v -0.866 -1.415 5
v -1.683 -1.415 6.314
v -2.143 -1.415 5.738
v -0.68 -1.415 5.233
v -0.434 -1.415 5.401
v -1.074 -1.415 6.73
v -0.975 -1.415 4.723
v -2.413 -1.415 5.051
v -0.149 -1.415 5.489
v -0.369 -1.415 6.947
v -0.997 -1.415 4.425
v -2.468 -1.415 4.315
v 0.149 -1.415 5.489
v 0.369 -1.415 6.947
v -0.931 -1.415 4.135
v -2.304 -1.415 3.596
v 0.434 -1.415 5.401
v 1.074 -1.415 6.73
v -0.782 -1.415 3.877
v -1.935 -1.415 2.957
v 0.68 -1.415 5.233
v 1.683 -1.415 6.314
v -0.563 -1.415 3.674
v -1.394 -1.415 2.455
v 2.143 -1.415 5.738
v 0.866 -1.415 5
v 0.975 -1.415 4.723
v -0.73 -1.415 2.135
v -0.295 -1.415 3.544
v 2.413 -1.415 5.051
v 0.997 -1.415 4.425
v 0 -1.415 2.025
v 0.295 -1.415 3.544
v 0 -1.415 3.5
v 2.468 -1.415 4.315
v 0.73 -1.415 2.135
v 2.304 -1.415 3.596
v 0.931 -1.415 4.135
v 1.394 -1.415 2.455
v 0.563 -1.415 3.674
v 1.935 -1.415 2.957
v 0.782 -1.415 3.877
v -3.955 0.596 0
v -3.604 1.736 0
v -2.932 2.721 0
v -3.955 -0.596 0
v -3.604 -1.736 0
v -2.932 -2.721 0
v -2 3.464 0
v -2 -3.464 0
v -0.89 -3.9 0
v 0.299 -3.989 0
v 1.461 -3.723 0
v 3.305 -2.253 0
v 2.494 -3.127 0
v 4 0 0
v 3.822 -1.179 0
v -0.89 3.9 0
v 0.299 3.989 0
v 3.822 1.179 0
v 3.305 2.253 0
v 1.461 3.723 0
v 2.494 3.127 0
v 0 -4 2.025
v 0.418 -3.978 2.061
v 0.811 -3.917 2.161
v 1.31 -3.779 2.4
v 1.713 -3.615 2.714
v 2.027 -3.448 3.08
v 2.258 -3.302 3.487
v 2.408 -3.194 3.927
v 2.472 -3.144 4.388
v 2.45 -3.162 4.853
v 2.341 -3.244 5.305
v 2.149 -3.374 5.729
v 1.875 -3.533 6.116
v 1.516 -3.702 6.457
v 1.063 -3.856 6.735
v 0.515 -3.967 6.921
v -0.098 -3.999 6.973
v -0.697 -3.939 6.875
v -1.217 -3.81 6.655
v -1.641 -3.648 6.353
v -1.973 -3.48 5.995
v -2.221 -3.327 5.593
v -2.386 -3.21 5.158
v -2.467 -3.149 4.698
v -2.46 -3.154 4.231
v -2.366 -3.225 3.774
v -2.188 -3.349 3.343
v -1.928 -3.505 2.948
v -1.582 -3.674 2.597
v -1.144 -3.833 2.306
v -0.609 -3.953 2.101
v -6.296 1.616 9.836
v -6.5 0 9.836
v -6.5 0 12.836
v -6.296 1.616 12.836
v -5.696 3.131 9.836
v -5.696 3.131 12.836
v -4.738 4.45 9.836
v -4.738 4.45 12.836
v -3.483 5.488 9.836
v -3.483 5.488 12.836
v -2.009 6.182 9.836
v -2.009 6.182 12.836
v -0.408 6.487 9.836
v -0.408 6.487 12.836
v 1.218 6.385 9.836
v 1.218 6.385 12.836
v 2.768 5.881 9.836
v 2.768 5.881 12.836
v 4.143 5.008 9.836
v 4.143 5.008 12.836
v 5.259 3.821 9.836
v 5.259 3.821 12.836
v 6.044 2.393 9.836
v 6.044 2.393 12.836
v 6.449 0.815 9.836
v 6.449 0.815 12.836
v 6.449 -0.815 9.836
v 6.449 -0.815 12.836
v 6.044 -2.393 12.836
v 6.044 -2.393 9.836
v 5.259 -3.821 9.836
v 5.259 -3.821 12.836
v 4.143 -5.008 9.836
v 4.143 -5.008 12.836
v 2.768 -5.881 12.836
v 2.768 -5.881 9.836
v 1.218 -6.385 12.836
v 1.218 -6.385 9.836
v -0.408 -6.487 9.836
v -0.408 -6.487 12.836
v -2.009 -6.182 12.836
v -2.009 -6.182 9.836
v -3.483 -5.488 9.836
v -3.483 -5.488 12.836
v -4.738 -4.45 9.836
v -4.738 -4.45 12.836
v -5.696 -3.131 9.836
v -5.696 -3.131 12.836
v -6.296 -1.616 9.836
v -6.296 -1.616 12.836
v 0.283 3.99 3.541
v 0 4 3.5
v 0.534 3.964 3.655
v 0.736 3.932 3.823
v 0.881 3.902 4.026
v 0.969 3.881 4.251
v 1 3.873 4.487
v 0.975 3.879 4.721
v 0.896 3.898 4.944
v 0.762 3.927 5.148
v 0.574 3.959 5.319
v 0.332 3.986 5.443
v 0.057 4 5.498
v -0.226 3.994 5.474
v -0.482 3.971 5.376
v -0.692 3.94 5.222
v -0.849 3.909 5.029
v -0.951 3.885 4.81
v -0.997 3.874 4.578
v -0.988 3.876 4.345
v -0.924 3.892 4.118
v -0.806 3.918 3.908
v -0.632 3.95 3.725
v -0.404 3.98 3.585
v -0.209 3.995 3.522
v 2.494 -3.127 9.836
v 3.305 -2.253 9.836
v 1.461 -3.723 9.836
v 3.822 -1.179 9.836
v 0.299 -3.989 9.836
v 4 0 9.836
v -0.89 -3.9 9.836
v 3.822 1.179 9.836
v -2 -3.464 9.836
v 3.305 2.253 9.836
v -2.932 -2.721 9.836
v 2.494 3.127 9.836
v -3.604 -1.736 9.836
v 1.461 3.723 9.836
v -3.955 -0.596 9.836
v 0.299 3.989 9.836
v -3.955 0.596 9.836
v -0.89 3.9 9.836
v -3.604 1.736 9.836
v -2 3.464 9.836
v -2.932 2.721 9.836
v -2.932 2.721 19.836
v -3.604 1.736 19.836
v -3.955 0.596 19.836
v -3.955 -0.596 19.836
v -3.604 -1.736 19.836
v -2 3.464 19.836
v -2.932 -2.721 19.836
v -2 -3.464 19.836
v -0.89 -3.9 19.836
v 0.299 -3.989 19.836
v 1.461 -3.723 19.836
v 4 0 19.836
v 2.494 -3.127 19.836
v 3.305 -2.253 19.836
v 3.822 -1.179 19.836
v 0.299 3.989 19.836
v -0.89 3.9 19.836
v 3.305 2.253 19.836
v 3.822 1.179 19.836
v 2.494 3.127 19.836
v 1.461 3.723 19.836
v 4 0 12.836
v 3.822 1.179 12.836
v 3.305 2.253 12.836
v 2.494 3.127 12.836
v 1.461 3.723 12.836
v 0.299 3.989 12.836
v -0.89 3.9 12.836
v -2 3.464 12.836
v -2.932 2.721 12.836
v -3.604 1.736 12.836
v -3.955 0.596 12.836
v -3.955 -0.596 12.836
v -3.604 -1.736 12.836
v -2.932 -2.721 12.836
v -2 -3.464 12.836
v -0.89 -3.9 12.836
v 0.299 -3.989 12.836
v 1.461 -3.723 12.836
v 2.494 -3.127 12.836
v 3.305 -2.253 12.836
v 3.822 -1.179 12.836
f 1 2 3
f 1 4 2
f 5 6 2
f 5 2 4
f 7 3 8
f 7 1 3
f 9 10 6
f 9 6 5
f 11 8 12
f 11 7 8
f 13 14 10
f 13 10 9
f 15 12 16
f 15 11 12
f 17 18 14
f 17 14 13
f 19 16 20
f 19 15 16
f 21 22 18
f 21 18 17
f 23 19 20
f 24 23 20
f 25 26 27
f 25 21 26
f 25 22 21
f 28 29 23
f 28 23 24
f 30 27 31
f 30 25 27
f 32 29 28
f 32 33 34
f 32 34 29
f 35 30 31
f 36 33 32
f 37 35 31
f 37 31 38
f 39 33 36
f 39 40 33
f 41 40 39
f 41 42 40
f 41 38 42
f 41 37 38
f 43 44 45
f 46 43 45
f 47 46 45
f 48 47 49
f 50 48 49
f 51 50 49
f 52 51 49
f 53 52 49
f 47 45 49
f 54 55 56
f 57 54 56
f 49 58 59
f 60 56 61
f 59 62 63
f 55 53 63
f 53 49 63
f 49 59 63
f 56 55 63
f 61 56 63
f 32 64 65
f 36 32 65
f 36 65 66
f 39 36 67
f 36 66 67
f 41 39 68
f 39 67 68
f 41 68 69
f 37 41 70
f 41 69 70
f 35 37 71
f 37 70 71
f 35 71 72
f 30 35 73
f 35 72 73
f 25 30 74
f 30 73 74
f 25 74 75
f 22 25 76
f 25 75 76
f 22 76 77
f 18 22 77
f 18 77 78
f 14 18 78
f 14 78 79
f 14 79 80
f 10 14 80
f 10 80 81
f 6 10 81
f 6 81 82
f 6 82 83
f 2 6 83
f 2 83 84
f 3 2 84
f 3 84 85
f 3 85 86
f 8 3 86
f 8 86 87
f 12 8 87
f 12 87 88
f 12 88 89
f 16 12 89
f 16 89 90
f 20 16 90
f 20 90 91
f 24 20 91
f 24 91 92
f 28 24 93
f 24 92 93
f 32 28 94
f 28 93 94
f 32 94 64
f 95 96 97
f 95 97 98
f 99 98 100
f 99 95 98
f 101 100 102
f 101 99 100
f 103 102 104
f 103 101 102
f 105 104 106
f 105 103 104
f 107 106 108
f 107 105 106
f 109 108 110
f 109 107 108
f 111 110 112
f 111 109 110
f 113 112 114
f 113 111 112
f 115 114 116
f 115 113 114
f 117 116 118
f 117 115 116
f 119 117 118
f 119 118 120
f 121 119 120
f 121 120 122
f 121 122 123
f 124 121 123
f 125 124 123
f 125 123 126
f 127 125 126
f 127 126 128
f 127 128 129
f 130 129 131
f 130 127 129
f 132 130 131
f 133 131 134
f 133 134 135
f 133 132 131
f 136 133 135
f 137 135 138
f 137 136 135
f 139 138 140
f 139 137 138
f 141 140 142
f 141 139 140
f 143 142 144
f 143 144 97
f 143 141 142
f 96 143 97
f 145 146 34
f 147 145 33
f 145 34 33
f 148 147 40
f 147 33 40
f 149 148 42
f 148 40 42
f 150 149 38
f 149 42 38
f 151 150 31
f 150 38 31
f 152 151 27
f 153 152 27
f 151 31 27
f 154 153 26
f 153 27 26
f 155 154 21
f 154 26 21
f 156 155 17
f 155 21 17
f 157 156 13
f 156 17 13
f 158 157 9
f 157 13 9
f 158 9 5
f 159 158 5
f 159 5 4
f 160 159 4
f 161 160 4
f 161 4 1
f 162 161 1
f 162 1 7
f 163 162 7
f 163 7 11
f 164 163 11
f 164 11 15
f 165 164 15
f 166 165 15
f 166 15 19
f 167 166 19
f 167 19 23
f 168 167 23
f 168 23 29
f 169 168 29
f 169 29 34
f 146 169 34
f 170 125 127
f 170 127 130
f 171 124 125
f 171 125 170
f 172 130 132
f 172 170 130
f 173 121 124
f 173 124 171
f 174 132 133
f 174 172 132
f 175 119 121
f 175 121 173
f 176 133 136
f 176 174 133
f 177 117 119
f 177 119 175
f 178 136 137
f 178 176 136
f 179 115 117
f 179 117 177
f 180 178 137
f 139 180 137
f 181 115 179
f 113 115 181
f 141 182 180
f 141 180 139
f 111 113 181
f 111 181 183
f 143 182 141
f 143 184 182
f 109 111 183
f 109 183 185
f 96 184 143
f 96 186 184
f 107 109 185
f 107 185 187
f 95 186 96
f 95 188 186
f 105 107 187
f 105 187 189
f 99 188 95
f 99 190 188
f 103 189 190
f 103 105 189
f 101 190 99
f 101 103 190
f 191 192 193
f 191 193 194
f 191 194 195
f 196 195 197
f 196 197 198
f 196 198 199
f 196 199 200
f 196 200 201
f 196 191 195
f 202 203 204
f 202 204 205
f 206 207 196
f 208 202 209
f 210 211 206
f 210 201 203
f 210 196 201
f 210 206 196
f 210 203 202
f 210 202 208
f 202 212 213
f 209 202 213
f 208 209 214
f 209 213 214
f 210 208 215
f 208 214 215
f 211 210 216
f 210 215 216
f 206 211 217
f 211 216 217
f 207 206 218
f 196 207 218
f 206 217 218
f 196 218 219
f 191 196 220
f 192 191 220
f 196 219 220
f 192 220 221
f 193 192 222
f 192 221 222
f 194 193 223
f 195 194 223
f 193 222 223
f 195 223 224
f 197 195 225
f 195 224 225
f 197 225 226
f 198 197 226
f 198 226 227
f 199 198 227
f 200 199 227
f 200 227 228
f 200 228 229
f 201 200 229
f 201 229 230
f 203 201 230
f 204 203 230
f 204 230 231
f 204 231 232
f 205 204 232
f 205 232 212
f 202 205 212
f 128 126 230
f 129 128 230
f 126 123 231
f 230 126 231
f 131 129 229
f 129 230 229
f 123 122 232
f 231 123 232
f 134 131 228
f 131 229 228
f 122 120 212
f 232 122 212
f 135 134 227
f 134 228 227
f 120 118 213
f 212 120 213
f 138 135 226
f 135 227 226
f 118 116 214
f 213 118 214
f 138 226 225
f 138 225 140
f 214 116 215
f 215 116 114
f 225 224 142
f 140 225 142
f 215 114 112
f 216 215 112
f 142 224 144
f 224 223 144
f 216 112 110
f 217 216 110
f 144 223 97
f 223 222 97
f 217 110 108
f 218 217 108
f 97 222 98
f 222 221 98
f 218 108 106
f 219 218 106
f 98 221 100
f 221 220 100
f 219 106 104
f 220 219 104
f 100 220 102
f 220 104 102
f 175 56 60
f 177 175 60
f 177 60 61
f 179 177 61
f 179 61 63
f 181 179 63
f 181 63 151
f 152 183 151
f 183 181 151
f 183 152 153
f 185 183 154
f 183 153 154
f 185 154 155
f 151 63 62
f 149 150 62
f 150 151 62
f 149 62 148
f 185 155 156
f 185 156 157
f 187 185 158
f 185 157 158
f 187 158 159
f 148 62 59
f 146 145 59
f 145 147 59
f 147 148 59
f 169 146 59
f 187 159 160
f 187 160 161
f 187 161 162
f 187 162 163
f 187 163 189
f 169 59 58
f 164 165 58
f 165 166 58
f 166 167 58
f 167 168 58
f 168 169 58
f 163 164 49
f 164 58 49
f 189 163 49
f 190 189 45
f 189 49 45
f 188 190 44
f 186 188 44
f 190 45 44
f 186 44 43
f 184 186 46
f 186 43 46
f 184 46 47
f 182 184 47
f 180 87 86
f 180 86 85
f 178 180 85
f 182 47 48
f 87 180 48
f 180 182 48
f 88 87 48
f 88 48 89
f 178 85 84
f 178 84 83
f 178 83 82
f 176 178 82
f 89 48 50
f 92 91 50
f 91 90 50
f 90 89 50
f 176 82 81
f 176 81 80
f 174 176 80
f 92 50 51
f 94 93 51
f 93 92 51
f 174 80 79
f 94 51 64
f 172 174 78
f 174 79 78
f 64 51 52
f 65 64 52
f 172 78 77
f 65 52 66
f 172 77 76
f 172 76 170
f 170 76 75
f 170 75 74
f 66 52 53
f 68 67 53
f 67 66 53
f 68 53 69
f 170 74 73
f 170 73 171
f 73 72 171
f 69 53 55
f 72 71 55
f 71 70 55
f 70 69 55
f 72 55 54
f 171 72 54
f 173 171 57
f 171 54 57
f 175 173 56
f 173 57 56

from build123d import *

# Parameters (mm, degrees)
SKETCH1_R           = 4
BOSS_EXTRUDE1_DEPTH = 19.83582727
SKETCH3_R           = 1
CUT_EXTRUDE1_DEPTH  = 22.759137012
SKETCH4_R           = 2.475
CUT_EXTRUDE2_DEPTH  = 2.58519454
BOSS_EXTRUDE2_START = 3
SKETCH5_R           = 6.5
SKETCH5_R_2         = 4
BOSS_EXTRUDE2_DEPTH = 3


with BuildPart() as part:
    # Sketch1 → Boss-Extrude1 (new body)
    with BuildSketch(Plane.XY):
        Circle(SKETCH1_R)
    extrude(amount=BOSS_EXTRUDE1_DEPTH)

    # Sketch3 → Cut-Extrude1 (cut, through all)
    with BuildSketch(Plane(origin=(0, -4, 0), x_dir=(-1, 0, 0), z_dir=(0, -1, 0))):
        with Locations(Location((0, -4.5, 0), (0, 0, 90))):
            Circle(SKETCH3_R)
    extrude(amount=-CUT_EXTRUDE1_DEPTH, mode=Mode.SUBTRACT)

    # Sketch4 → Cut-Extrude2 (cut)
    with BuildSketch(Plane(origin=(0, -4, 0), x_dir=(-1, 0, 0), z_dir=(0, -1, 0))):
        with Locations(Location((0, -4.5, 0), (0, 0, 90))):
            Circle(SKETCH4_R)
    extrude(amount=-CUT_EXTRUDE2_DEPTH, mode=Mode.SUBTRACT)

    # Sketch5 → Boss-Extrude2 (add)
    with BuildSketch(Plane(origin=(0, 0, 12.8359246), x_dir=(-1, 0, 0), z_dir=(0, 0, -1)).offset(BOSS_EXTRUDE2_START)):
        Circle(SKETCH5_R)
        Circle(SKETCH5_R_2, mode=Mode.SUBTRACT)
    extrude(amount=-BOSS_EXTRUDE2_DEPTH)


solid = part.part
